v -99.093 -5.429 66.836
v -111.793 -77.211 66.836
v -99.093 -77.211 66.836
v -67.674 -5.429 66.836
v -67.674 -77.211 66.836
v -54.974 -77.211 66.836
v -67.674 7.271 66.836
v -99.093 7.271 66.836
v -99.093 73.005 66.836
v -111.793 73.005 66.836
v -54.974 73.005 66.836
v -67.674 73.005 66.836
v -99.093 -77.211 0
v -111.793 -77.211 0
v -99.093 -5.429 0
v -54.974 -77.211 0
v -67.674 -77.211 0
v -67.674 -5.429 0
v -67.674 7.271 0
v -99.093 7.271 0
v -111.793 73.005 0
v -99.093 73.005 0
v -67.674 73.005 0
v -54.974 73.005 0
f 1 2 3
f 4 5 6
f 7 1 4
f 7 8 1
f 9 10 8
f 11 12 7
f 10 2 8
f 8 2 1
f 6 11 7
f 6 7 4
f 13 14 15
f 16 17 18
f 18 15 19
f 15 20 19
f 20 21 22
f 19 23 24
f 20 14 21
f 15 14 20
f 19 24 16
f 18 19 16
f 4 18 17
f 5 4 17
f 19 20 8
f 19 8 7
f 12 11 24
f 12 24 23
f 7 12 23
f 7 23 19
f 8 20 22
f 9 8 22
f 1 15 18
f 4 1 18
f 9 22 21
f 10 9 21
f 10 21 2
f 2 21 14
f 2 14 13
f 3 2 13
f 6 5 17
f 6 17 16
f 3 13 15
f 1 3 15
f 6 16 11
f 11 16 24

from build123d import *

# Parameters (mm, degrees)
F0_W     = 31.419306
F0_H     = 12.7
F1_DEPTH = 66.83598


with BuildPart() as f1:
    # F0 (on Top) → F1 (new body)
    with BuildSketch(Plane.XY):
        Polygon((-99.093348, 73.004946), (-111.793348, 73.004946), (-111.793348, -77.210762), (-99.093348, -77.210762), (-99.093348, -5.429364), (-99.093348, 7.270636), align=None)
        with Locations((-83.383695, 0.920636)):
            Rectangle(F0_W, F0_H)
        Polygon((-67.674042, 73.004946), (-67.674042, 7.270636), (-67.674042, -5.429364), (-67.674042, -77.210762), (-54.974042, -77.210762), (-54.974042, 73.004946), align=None)
    extrude(amount=F1_DEPTH)


solid = f1.part
